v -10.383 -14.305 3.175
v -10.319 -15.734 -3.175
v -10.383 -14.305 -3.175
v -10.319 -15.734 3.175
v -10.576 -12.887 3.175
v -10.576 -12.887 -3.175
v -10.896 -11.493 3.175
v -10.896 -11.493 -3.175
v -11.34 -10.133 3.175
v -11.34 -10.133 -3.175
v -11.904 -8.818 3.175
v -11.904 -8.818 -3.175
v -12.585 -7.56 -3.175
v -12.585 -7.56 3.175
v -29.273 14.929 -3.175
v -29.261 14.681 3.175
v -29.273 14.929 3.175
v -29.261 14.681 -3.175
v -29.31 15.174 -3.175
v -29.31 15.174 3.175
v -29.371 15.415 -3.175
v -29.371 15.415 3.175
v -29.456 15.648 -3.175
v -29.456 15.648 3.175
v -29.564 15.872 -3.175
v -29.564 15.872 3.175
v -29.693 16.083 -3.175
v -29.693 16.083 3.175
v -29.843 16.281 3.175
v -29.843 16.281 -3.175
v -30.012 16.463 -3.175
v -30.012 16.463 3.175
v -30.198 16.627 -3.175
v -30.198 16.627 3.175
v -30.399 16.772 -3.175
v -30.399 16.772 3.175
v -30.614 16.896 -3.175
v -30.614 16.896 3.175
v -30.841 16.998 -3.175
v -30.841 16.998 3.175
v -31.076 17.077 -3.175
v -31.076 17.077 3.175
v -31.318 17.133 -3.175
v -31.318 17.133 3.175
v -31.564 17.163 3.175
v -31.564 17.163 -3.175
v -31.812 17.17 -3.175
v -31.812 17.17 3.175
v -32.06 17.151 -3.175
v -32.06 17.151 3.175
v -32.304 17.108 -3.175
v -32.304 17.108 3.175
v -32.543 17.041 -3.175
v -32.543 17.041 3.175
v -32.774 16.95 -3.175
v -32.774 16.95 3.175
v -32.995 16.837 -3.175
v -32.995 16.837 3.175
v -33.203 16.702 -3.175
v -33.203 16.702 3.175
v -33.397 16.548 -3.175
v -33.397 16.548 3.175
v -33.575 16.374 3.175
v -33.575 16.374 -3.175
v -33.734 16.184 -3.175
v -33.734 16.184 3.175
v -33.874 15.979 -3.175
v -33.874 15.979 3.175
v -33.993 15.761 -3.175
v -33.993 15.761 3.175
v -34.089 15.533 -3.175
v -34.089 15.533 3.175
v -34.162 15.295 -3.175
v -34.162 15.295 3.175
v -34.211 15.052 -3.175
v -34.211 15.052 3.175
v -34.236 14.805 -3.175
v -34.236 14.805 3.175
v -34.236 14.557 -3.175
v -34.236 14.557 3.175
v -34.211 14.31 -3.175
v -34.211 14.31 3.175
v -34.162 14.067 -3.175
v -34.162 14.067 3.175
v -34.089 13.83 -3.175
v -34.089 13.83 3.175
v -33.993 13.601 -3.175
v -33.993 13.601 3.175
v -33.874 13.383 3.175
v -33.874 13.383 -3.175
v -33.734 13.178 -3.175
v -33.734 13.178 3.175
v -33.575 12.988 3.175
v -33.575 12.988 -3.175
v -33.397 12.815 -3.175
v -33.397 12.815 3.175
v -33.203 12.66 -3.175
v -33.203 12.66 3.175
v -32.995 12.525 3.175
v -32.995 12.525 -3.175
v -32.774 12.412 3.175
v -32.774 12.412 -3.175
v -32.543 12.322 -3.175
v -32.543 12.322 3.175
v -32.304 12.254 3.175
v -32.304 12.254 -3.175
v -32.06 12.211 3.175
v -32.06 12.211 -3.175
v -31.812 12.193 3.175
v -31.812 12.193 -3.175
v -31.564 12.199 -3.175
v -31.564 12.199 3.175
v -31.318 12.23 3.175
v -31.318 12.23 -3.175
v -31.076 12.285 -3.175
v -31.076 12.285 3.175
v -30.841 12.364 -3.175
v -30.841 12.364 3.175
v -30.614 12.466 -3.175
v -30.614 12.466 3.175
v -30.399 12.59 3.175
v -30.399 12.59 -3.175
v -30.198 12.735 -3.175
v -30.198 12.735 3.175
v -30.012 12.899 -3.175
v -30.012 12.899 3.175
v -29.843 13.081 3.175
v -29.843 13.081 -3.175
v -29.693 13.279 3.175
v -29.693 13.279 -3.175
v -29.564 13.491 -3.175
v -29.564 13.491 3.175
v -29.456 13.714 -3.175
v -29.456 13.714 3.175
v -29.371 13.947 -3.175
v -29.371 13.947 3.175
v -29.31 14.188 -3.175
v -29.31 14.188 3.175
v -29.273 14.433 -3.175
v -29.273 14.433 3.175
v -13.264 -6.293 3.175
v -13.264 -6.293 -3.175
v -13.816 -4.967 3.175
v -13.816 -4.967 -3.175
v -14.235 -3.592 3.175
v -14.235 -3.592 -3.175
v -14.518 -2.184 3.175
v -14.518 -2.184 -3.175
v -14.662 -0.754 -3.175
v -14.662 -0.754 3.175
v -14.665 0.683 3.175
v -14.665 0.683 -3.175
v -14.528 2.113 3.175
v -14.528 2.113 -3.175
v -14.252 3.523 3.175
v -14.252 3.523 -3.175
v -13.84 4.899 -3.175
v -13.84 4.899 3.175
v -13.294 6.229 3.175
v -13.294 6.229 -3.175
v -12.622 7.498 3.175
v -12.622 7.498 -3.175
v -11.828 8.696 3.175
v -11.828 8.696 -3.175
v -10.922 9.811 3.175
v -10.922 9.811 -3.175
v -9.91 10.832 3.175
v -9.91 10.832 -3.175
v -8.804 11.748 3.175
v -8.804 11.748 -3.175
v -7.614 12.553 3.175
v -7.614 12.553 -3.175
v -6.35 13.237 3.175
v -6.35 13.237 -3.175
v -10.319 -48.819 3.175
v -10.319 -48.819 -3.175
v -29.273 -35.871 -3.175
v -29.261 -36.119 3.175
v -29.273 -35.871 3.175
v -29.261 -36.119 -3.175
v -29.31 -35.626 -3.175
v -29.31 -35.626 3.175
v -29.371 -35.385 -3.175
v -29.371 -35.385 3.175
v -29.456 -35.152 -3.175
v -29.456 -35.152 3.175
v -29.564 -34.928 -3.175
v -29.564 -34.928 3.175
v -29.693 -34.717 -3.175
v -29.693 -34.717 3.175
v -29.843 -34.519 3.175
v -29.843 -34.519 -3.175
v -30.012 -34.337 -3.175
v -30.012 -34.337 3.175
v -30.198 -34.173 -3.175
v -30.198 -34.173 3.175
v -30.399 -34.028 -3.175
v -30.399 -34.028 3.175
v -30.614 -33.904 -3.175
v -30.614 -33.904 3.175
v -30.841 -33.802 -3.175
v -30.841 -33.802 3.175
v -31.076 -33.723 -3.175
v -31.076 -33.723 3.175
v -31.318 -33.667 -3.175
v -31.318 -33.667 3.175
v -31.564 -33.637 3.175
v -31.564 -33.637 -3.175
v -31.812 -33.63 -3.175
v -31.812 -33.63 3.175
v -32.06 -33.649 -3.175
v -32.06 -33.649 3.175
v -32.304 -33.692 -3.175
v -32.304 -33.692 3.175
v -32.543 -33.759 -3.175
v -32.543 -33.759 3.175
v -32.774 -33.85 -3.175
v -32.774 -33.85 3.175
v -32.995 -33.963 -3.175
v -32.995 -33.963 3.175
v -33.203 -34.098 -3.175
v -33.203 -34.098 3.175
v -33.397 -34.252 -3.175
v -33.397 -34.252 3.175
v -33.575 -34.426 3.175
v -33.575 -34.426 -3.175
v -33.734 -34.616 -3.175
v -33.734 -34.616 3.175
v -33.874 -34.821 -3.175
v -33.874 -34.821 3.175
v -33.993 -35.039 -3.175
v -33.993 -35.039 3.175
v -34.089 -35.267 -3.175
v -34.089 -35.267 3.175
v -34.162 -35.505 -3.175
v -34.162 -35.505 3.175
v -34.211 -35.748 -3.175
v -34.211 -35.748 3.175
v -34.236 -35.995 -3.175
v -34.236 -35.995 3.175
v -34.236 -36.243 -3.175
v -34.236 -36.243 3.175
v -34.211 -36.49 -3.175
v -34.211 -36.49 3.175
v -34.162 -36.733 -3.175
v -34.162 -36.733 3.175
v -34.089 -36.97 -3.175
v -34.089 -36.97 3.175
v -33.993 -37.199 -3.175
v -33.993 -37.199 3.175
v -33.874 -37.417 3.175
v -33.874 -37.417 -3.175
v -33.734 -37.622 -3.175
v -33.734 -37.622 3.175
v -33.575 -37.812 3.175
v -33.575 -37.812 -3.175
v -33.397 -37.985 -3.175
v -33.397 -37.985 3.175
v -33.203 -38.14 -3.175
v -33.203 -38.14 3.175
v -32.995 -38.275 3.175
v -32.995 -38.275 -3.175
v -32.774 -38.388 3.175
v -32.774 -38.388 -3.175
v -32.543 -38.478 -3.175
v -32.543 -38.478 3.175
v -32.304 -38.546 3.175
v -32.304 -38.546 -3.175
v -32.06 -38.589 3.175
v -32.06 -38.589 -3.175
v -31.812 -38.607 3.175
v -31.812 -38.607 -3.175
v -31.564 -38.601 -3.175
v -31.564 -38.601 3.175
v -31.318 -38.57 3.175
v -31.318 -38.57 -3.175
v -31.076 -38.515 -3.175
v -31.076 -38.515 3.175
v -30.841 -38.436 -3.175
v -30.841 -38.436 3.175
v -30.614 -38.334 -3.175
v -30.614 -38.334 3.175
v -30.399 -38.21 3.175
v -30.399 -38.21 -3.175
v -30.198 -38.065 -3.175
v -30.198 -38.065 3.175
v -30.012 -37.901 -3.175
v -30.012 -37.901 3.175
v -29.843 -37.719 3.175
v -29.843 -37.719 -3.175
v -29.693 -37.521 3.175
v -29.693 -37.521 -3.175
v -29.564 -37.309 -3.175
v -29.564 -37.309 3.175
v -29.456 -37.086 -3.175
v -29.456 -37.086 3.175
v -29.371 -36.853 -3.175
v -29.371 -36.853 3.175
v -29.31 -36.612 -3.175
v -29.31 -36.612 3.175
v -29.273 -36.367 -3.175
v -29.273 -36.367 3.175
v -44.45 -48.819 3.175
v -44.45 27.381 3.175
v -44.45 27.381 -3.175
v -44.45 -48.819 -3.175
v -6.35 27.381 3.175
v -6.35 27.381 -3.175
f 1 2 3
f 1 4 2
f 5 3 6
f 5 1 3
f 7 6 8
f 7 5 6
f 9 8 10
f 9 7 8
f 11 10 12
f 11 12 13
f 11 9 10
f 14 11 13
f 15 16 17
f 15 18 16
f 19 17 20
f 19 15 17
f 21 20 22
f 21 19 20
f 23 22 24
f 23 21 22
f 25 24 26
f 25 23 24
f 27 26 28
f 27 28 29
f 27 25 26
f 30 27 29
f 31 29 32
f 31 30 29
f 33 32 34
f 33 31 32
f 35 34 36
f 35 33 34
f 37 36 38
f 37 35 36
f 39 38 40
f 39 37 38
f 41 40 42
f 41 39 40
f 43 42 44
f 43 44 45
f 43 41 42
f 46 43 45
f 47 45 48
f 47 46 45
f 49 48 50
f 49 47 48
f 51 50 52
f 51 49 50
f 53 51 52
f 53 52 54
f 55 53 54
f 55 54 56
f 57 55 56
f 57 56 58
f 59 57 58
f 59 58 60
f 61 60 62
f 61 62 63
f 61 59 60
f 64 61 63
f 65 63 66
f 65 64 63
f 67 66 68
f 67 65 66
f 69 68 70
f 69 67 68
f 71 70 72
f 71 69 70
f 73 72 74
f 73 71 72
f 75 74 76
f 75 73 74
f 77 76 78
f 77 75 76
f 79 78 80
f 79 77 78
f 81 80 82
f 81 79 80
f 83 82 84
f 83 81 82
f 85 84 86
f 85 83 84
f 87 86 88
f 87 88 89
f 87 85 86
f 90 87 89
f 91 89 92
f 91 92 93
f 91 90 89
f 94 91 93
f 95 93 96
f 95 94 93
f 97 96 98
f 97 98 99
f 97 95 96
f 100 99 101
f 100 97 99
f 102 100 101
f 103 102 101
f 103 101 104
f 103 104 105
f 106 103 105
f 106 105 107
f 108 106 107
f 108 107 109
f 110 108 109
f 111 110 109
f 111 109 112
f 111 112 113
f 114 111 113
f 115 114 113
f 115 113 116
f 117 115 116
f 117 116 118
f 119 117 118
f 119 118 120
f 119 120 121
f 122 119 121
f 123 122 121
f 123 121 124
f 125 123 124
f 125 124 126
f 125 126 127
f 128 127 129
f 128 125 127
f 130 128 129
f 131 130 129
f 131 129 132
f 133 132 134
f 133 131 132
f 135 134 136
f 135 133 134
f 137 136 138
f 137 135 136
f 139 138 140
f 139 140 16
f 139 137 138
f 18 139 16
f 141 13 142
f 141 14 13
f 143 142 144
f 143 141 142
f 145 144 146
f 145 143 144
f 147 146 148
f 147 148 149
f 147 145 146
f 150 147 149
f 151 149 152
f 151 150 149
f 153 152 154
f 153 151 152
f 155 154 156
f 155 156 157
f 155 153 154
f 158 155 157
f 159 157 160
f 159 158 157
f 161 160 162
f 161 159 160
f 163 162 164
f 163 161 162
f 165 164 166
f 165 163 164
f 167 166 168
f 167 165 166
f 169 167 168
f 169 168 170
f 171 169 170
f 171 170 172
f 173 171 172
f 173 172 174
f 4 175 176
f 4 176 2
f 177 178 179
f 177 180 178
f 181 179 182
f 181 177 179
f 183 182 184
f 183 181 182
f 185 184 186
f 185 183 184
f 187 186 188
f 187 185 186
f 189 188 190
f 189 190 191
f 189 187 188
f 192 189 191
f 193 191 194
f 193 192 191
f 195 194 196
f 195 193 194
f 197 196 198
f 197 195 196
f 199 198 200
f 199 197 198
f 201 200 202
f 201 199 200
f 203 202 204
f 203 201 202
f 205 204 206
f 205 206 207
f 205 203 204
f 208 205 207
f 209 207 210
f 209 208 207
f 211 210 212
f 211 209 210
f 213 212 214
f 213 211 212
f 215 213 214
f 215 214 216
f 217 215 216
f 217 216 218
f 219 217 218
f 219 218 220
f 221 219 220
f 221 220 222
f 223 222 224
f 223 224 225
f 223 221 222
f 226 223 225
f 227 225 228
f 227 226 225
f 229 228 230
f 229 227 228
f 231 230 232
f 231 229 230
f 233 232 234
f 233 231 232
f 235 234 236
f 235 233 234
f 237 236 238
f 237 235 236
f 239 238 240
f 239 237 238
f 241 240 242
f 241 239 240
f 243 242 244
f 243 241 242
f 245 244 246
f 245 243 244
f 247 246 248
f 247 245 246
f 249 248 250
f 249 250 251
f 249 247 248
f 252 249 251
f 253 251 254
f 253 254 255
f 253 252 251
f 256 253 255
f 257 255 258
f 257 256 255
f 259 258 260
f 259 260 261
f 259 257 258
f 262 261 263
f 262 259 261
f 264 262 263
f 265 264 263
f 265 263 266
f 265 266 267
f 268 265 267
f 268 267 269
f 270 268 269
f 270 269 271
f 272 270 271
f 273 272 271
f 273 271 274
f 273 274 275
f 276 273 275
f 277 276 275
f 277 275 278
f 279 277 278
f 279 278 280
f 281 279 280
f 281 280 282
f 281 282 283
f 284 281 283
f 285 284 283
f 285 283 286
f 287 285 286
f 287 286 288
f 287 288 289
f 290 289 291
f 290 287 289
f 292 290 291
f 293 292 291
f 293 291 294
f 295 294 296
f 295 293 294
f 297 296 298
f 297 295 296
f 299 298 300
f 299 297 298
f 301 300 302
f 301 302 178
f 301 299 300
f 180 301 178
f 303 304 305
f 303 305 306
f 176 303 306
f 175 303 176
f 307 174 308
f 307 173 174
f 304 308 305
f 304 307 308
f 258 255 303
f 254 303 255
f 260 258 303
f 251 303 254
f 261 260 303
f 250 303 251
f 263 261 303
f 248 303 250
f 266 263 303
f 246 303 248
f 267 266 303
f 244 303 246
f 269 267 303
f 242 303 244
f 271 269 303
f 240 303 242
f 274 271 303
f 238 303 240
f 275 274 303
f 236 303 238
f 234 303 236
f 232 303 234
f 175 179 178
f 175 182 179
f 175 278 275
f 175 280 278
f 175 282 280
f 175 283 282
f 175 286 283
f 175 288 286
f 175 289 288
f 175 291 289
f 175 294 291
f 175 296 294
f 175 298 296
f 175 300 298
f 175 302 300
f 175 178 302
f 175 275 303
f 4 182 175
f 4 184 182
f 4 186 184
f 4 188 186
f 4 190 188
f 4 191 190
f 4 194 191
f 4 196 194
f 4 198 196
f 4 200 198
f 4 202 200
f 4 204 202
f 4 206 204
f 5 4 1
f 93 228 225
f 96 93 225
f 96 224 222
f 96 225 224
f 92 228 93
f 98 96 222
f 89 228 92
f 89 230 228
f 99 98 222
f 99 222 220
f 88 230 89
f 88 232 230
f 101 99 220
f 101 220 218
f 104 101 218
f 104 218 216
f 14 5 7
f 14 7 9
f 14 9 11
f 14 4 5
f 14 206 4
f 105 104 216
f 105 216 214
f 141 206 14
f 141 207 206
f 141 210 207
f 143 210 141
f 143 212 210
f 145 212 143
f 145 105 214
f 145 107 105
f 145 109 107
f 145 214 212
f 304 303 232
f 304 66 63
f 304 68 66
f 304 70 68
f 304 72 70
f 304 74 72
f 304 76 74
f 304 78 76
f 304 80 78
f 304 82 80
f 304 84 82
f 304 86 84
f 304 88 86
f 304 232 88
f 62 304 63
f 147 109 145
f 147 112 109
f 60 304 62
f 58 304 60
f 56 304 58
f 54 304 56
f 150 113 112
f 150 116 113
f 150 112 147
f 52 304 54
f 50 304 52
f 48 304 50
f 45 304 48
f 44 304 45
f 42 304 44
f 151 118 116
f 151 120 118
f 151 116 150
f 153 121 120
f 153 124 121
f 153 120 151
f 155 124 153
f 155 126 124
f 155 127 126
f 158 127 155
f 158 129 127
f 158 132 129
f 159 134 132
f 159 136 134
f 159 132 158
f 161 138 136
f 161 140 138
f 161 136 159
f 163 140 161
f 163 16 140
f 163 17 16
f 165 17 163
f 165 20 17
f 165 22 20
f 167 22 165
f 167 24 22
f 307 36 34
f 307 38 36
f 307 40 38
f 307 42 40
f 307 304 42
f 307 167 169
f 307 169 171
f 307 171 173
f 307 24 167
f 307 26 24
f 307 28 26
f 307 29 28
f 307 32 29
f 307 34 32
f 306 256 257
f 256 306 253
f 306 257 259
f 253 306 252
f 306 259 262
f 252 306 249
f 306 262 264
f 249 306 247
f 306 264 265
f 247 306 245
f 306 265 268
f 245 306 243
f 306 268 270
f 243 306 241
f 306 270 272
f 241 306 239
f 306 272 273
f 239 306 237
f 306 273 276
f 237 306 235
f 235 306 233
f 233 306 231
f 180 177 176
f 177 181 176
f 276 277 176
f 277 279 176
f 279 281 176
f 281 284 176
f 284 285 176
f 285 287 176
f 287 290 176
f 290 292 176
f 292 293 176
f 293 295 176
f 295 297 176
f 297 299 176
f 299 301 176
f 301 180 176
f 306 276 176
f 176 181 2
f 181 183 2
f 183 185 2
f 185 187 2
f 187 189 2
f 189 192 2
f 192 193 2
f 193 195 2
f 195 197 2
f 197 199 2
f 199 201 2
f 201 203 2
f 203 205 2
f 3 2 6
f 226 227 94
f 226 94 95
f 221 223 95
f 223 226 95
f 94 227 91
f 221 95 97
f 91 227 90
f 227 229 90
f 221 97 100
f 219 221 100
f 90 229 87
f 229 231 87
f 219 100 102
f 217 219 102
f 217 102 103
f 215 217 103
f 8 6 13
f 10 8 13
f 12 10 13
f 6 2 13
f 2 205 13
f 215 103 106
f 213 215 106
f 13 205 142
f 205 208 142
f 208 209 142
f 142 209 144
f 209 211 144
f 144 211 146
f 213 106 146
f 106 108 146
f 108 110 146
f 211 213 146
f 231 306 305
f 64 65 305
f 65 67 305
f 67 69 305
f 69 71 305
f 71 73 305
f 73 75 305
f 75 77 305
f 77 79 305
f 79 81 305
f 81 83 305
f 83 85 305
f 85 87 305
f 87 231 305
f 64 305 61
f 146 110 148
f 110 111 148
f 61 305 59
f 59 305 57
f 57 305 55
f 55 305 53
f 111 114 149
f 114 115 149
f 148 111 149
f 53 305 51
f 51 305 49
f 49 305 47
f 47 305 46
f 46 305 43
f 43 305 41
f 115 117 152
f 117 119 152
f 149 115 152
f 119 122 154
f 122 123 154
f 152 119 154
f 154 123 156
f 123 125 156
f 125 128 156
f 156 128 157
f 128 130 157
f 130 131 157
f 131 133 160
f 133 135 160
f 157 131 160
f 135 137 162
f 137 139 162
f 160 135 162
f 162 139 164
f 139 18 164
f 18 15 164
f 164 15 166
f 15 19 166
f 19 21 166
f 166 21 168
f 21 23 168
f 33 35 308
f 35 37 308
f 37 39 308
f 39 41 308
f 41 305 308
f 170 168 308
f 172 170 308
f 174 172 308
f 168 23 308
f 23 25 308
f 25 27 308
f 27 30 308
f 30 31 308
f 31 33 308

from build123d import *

# Parameters (mm, degrees)
SKETCH1_R           = 2.4892
BOSS_EXTRUDE1_DEPTH = 3.175


with BuildPart() as part:
    # Sketch1 → Boss-Extrude1 (new, symmetric)
    with BuildSketch(Plane.XY):
        with BuildLine():
            Line((-6.35, 27.3812), (-44.45, 27.3812))
            Line((-44.45, 27.3812), (-44.45, -48.8188))
            Line((-44.45, -48.8188), (-10.31875, -48.8188))
            Line((-10.31875, -48.8188), (-10.31875, -15.734319794))
            ThreePointArc((-10.31875, -15.734319794), (-10.89585042, -11.492870345), (-12.585193267, -7.559797873))
            ThreePointArc((-12.585193267, -7.559797873), (-14.062748456, 4.216247062), (-6.35, 13.236885338))
            Line((-6.35, 13.236885338), (-6.35, 27.3812))
        make_face()
        with Locations((-31.75, 14.6812)):
            Circle(SKETCH1_R, mode=Mode.SUBTRACT)
        with Locations((-31.75, -36.1188)):
            Circle(SKETCH1_R, mode=Mode.SUBTRACT)
    extrude(amount=BOSS_EXTRUDE1_DEPTH, both=True)


solid = part.part
